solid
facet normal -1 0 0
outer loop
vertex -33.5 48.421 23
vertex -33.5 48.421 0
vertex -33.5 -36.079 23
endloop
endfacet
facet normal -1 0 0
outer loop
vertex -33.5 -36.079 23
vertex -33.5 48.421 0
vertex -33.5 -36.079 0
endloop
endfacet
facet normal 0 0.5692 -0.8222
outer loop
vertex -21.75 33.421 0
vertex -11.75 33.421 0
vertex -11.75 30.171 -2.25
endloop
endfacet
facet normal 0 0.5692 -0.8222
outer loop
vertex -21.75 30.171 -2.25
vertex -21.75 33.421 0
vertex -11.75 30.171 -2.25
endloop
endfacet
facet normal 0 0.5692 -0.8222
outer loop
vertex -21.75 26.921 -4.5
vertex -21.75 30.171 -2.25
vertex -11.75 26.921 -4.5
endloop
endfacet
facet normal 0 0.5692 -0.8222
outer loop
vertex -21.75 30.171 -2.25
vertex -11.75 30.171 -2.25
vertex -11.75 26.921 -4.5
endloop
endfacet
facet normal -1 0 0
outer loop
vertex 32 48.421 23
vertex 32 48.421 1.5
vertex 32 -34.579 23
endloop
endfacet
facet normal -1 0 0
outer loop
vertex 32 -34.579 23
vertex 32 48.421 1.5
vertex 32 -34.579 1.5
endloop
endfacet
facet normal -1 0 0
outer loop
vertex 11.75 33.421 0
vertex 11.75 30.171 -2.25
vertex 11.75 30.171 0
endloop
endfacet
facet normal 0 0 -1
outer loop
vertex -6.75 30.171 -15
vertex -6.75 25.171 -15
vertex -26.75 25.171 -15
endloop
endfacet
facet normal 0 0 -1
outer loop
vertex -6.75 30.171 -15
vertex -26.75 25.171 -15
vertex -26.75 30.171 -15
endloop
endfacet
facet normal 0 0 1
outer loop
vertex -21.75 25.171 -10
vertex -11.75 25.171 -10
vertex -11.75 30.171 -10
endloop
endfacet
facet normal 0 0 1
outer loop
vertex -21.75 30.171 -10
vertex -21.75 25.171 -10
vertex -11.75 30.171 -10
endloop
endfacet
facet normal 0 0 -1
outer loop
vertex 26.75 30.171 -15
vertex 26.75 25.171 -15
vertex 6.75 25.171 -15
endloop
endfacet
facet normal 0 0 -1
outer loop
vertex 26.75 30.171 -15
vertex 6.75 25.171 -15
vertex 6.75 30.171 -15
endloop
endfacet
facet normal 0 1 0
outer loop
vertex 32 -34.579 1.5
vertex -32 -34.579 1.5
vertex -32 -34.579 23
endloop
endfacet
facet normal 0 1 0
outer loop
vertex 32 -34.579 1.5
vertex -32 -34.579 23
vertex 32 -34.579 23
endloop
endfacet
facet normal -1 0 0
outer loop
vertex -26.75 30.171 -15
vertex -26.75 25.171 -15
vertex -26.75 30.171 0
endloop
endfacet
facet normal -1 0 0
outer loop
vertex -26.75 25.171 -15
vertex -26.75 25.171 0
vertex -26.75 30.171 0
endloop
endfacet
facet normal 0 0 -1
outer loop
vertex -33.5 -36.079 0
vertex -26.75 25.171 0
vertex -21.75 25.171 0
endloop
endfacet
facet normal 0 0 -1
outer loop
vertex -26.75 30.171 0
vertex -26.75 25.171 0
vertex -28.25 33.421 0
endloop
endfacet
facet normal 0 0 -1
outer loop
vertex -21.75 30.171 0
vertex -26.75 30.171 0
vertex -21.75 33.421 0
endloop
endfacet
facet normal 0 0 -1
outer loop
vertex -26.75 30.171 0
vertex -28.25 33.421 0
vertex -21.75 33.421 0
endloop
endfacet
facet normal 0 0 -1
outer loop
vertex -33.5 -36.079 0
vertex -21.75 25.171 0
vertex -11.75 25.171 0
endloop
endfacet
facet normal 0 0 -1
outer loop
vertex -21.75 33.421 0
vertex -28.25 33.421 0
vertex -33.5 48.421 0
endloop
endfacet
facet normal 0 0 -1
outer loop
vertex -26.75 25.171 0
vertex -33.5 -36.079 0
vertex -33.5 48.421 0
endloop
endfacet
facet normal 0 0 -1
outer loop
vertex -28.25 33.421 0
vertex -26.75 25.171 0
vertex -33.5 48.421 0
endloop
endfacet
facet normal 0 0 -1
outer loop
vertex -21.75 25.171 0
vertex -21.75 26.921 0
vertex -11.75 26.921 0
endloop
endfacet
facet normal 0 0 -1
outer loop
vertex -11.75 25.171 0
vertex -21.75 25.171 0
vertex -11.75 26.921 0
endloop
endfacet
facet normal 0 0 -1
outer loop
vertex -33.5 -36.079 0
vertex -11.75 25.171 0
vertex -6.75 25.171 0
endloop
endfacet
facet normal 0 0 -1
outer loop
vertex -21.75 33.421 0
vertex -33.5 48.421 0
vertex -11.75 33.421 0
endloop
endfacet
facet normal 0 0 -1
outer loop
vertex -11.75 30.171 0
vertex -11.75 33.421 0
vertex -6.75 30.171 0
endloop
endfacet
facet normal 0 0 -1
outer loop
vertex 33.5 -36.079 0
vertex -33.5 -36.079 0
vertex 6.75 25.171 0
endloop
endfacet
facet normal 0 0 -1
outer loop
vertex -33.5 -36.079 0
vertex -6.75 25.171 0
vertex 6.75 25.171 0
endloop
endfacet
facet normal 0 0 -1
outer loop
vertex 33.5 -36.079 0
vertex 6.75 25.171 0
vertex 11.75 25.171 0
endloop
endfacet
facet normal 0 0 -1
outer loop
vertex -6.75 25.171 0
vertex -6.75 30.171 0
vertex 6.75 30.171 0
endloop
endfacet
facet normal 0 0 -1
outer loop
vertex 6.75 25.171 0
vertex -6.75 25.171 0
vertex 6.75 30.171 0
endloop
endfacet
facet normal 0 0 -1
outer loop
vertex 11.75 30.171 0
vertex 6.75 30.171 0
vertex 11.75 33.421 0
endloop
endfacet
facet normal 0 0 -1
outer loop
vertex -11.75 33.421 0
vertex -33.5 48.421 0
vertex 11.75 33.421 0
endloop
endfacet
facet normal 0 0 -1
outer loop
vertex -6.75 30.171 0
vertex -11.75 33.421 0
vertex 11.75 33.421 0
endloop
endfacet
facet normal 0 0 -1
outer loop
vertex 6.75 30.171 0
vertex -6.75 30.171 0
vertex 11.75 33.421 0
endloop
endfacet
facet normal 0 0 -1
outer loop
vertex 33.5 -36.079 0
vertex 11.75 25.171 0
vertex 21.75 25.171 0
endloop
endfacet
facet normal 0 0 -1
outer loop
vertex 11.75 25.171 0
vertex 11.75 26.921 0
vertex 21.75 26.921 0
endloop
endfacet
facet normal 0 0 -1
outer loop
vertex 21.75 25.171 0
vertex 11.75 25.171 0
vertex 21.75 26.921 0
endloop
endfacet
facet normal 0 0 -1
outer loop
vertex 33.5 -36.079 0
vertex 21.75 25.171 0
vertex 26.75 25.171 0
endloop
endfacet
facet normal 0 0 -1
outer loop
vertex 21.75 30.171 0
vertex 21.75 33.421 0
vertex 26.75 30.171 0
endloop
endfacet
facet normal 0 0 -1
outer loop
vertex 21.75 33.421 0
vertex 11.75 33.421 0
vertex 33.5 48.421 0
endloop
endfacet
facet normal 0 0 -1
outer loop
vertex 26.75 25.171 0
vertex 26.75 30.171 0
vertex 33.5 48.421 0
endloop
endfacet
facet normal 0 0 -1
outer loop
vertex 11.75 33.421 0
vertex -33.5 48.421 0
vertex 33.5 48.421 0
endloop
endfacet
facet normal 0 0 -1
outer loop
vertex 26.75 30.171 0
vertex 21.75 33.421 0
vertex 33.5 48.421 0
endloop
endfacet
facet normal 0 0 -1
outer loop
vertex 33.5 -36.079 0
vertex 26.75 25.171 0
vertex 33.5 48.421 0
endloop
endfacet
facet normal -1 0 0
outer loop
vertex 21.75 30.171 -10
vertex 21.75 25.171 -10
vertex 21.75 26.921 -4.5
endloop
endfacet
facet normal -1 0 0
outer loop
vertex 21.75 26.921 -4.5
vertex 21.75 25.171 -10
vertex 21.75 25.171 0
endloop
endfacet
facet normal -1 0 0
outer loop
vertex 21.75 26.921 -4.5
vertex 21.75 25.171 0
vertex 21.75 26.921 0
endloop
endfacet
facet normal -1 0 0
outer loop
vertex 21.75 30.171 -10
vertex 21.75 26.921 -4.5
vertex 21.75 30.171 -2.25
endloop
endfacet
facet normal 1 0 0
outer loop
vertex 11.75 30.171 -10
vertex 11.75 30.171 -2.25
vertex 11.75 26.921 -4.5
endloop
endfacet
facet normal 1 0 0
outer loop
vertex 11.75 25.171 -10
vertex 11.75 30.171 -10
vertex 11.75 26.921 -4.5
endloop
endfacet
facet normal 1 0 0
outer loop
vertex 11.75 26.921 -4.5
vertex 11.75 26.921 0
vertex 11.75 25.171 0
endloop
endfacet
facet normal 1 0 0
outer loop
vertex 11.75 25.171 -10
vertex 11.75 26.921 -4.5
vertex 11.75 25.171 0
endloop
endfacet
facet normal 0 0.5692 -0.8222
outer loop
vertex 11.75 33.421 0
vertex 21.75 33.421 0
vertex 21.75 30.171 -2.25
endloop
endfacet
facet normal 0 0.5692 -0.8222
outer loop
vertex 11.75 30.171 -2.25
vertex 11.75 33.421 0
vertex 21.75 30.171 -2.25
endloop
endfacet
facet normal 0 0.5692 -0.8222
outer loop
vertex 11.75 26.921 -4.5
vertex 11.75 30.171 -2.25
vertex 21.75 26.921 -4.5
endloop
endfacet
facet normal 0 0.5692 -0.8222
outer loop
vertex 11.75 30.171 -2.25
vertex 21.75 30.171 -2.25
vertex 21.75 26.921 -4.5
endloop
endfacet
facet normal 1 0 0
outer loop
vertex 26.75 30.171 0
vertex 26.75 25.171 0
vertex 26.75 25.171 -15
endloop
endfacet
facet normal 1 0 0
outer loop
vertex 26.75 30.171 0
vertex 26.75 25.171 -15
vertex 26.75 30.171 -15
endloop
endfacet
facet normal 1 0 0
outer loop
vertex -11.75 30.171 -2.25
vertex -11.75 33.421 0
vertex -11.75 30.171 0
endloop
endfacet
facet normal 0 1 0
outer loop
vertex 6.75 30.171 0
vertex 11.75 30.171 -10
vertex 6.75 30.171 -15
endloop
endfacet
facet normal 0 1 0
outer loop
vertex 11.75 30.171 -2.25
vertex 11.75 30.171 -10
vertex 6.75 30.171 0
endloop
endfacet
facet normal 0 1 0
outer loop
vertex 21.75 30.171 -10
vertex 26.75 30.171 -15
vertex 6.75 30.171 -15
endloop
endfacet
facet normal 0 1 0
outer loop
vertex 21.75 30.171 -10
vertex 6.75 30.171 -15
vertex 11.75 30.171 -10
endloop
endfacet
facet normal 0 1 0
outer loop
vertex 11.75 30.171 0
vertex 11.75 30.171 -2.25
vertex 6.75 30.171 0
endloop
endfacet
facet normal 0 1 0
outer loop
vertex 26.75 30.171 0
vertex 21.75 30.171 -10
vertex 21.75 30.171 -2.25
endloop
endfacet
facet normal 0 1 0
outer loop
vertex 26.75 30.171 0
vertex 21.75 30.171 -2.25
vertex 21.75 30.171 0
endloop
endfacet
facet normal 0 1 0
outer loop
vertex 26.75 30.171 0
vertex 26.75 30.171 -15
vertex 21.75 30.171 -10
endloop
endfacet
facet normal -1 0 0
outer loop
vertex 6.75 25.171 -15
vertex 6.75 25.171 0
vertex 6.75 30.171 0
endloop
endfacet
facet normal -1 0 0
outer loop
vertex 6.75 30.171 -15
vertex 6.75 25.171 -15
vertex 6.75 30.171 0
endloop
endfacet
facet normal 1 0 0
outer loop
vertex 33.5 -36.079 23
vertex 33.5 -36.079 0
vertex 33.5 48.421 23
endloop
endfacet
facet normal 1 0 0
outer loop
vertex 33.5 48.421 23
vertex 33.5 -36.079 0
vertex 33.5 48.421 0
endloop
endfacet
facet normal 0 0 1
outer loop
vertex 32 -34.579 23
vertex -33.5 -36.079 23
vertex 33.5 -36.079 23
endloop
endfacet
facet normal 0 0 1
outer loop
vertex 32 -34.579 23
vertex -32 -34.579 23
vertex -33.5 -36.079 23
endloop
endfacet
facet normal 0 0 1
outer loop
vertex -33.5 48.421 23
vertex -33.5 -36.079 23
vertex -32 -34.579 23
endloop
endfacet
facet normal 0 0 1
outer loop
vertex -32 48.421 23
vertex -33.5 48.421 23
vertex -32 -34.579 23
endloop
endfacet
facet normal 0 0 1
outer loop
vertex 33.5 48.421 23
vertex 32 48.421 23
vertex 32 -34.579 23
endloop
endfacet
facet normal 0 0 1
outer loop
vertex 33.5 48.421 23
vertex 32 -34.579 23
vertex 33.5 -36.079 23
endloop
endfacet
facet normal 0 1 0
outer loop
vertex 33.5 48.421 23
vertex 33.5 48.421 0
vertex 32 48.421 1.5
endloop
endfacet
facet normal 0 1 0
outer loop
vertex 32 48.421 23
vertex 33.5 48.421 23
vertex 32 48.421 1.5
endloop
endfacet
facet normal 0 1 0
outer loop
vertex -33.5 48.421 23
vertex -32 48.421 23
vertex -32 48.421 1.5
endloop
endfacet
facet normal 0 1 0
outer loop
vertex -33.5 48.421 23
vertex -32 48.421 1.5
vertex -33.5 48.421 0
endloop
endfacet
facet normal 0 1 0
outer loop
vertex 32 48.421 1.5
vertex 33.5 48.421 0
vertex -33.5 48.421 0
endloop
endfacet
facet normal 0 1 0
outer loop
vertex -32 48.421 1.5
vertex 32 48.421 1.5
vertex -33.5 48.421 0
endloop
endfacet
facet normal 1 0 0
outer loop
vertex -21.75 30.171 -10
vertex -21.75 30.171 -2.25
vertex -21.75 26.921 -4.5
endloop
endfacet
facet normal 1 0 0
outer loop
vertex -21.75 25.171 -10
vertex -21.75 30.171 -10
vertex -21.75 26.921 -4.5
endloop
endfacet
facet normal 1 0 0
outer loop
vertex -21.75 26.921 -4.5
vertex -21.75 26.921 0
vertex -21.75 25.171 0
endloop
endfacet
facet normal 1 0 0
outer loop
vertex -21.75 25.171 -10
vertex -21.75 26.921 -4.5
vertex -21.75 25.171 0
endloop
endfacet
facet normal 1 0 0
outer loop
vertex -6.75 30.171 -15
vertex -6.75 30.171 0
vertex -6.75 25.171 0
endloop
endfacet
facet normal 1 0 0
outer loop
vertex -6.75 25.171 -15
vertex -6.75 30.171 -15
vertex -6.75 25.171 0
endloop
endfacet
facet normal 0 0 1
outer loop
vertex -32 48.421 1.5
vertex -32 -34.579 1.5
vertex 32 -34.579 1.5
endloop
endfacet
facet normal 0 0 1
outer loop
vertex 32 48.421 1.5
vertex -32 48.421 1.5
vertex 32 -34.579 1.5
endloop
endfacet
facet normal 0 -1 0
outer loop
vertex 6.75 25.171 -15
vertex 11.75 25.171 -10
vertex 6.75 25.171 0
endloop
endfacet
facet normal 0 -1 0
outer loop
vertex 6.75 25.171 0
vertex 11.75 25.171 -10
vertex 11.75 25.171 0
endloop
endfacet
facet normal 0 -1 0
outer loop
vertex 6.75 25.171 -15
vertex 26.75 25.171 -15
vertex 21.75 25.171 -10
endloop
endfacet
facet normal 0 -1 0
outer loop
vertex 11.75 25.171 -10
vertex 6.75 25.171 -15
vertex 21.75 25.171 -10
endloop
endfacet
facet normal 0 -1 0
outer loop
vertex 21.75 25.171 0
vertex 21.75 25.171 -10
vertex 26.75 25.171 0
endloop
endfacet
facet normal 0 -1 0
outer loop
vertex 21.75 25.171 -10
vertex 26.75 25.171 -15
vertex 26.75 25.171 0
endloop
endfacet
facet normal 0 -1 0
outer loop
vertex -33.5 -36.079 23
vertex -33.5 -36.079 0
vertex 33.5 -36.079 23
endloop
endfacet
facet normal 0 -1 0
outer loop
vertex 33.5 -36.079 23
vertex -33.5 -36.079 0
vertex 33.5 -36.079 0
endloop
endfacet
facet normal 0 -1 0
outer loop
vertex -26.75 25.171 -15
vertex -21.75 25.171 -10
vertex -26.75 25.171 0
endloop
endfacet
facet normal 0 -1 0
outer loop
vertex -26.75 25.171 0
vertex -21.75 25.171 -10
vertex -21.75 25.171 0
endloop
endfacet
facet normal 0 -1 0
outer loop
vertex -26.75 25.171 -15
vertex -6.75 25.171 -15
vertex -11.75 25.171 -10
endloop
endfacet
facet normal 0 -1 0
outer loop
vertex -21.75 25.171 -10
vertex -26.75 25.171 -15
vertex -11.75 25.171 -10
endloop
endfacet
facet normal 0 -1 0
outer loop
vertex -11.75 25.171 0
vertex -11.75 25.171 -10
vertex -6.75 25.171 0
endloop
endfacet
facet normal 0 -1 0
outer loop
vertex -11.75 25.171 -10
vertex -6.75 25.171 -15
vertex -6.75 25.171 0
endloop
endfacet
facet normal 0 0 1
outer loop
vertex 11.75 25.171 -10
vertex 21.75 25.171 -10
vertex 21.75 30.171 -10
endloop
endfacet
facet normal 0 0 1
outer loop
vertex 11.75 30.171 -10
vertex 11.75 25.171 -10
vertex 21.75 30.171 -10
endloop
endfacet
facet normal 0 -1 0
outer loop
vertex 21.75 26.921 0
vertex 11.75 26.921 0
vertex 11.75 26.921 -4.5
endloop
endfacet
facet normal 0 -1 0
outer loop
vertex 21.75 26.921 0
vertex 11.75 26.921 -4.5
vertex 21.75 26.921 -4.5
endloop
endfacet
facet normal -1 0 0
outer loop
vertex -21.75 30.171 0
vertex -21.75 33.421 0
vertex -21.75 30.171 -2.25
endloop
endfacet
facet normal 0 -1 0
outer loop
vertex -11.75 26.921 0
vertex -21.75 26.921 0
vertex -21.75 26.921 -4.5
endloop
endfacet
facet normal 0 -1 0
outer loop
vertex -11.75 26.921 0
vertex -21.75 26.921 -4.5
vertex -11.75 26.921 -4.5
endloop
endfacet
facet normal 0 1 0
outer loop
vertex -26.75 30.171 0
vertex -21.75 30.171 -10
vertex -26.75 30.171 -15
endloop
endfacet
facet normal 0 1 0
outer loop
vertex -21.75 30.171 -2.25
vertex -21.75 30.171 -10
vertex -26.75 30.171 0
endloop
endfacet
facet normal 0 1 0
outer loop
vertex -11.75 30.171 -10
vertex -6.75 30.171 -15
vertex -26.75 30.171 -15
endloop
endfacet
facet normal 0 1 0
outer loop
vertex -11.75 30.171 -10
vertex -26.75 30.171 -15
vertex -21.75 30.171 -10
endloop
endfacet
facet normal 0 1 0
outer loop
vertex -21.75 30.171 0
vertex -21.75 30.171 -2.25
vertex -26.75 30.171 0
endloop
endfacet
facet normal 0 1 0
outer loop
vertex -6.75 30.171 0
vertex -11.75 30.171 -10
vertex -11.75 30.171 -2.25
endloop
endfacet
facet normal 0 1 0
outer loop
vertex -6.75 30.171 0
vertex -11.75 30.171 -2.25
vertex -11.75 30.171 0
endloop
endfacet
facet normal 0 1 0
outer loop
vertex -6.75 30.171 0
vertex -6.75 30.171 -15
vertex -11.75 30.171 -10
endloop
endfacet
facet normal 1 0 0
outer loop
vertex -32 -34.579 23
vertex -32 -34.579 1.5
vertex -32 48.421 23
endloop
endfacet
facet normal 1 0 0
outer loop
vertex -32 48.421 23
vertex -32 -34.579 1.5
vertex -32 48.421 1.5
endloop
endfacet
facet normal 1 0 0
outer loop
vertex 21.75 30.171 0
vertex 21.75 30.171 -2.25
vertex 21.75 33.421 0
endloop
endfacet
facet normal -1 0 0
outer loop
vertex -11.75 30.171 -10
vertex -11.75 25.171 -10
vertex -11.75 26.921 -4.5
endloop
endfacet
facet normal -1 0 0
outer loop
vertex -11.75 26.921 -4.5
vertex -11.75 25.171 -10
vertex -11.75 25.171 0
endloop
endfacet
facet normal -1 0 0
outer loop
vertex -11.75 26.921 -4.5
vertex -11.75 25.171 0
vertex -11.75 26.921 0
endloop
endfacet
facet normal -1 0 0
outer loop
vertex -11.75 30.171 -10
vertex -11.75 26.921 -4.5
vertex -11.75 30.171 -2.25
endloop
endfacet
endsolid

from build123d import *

# Parameters (mm, degrees)
F0_W      = 64
F0_H      = 1.5
F1_DEPTH  = 23
F0_H_2    = 83
F2_DEPTH  = 1.5
F5_W      = 10
F5_H      = 1.5
F6_DEPTH  = 4.5
F7_W      = 10
F7_H      = 4.5
F9_DEPTH  = 5
F11_DEPTH = 50
F12_DEPTH = 10
F13_W     = 5
F13_H     = 5
F14_DEPTH = 53.5
F15_W     = 13.5
F15_H     = 5
F16_DEPTH = 25


with BuildPart() as f1:
    # F0 (on Top) → F1 (new body)
    with BuildSketch(Plane.XY):
        Polygon((-32, 48.42079), (-33.5, 48.42079), (-33.5, -36.07921), (-32, -36.07921), (-32, -34.57921), align=None)
        with Locations((0, -35.32921)):
            Rectangle(F0_W, F0_H)
        Polygon((33.5, 48.42079), (32, 48.42079), (32, -34.57921), (32, -36.07921), (33.5, -36.07921), align=None)
    extrude(amount=F1_DEPTH)

    # F0 (on Top) → F2 (join)
    with BuildSketch(Plane.XY):
        Polygon((-32, 48.42079), (-33.5, 48.42079), (-33.5, -36.07921), (-32, -36.07921), (-32, -34.57921), align=None)
        with Locations((0, 6.92079)):
            Rectangle(F0_W, F0_H_2)
        Polygon((33.5, 48.42079), (32, 48.42079), (32, -34.57921), (32, -36.07921), (33.5, -36.07921), align=None)
        with Locations((0, -35.32921)):
            Rectangle(F0_W, F0_H)
    extrude(amount=F2_DEPTH)


with BuildPart() as f3_1:
    # F3: copy of F1
    add(f1.part)

    # F5 (on face) → F6 (join)
    with BuildSketch(Plane(origin=(0, 0, 0), x_dir=(1, 0, 0), z_dir=(0, 0, -1))):
        with Locations((16.75, -27.67079)):
            Rectangle(F5_W, F5_H)
        with Locations((-16.75, -27.67079)):
            Rectangle(F5_W, F5_H)
    extrude(amount=F6_DEPTH)

    # F7 (on face) → F9 (join)
    with BuildSketch(Plane(origin=(0, 28.42079, 0), x_dir=(-1, 0, 0), z_dir=(0, 1, 0))):
        with Locations((-16.75, -2.25)):
            Rectangle(F7_W, F7_H)
        with Locations((16.75, -2.25)):
            Rectangle(F7_W, F7_H)
    extrude(amount=F9_DEPTH)

    # F10 (on face) → F11 (cut)
    with BuildSketch(Plane.YZ.offset(21.75)):
        Polygon((33.42079, -4.5), (33.42079, 0), (26.92079, -4.5), align=None)
    extrude(amount=-F11_DEPTH, mode=Mode.SUBTRACT)

    # F8 (on face) → F12 (join)
    with BuildSketch(Plane(origin=(0, 0, 0), x_dir=(1, 0, 0), z_dir=(0, 0, -1))):
        Polygon((-21.75, -26.92079), (-21.75, -25.17079), (-26.75, -25.17079), (-26.75, -30.17079), (-21.75, -30.17079), (-21.75, -28.42079), align=None)
        Polygon((-11.75, -25.17079), (-11.75, -26.92079), (-11.75, -28.42079), (-11.75, -30.17079), (-6.75, -30.17079), (-6.75, -25.17079), align=None)
        Polygon((11.75, -25.17079), (6.75, -25.17079), (6.75, -30.17079), (11.75, -30.17079), (11.75, -28.42079), (11.75, -26.92079), align=None)
        Polygon((21.75, -25.17079), (21.75, -26.92079), (21.75, -28.42079), (21.75, -30.17079), (26.75, -30.17079), (26.75, -25.17079), align=None)
    extrude(amount=F12_DEPTH)

    # F13 (on face) → F14 (join)
    with BuildSketch(Plane.YZ.offset(26.75)):
        with Locations((27.67079, -12.5)):
            Rectangle(F13_W, F13_H)
    extrude(amount=-F14_DEPTH)

    # F15 (on face) → F16 (cut)
    with BuildSketch(Plane(origin=(0, 30.17079, 0), x_dir=(-1, 0, 0), z_dir=(0, 1, 0))):
        with Locations((0, -12.5)):
            Rectangle(F15_W, F15_H)
    extrude(amount=-F16_DEPTH, mode=Mode.SUBTRACT)


solid = f3_1.part
